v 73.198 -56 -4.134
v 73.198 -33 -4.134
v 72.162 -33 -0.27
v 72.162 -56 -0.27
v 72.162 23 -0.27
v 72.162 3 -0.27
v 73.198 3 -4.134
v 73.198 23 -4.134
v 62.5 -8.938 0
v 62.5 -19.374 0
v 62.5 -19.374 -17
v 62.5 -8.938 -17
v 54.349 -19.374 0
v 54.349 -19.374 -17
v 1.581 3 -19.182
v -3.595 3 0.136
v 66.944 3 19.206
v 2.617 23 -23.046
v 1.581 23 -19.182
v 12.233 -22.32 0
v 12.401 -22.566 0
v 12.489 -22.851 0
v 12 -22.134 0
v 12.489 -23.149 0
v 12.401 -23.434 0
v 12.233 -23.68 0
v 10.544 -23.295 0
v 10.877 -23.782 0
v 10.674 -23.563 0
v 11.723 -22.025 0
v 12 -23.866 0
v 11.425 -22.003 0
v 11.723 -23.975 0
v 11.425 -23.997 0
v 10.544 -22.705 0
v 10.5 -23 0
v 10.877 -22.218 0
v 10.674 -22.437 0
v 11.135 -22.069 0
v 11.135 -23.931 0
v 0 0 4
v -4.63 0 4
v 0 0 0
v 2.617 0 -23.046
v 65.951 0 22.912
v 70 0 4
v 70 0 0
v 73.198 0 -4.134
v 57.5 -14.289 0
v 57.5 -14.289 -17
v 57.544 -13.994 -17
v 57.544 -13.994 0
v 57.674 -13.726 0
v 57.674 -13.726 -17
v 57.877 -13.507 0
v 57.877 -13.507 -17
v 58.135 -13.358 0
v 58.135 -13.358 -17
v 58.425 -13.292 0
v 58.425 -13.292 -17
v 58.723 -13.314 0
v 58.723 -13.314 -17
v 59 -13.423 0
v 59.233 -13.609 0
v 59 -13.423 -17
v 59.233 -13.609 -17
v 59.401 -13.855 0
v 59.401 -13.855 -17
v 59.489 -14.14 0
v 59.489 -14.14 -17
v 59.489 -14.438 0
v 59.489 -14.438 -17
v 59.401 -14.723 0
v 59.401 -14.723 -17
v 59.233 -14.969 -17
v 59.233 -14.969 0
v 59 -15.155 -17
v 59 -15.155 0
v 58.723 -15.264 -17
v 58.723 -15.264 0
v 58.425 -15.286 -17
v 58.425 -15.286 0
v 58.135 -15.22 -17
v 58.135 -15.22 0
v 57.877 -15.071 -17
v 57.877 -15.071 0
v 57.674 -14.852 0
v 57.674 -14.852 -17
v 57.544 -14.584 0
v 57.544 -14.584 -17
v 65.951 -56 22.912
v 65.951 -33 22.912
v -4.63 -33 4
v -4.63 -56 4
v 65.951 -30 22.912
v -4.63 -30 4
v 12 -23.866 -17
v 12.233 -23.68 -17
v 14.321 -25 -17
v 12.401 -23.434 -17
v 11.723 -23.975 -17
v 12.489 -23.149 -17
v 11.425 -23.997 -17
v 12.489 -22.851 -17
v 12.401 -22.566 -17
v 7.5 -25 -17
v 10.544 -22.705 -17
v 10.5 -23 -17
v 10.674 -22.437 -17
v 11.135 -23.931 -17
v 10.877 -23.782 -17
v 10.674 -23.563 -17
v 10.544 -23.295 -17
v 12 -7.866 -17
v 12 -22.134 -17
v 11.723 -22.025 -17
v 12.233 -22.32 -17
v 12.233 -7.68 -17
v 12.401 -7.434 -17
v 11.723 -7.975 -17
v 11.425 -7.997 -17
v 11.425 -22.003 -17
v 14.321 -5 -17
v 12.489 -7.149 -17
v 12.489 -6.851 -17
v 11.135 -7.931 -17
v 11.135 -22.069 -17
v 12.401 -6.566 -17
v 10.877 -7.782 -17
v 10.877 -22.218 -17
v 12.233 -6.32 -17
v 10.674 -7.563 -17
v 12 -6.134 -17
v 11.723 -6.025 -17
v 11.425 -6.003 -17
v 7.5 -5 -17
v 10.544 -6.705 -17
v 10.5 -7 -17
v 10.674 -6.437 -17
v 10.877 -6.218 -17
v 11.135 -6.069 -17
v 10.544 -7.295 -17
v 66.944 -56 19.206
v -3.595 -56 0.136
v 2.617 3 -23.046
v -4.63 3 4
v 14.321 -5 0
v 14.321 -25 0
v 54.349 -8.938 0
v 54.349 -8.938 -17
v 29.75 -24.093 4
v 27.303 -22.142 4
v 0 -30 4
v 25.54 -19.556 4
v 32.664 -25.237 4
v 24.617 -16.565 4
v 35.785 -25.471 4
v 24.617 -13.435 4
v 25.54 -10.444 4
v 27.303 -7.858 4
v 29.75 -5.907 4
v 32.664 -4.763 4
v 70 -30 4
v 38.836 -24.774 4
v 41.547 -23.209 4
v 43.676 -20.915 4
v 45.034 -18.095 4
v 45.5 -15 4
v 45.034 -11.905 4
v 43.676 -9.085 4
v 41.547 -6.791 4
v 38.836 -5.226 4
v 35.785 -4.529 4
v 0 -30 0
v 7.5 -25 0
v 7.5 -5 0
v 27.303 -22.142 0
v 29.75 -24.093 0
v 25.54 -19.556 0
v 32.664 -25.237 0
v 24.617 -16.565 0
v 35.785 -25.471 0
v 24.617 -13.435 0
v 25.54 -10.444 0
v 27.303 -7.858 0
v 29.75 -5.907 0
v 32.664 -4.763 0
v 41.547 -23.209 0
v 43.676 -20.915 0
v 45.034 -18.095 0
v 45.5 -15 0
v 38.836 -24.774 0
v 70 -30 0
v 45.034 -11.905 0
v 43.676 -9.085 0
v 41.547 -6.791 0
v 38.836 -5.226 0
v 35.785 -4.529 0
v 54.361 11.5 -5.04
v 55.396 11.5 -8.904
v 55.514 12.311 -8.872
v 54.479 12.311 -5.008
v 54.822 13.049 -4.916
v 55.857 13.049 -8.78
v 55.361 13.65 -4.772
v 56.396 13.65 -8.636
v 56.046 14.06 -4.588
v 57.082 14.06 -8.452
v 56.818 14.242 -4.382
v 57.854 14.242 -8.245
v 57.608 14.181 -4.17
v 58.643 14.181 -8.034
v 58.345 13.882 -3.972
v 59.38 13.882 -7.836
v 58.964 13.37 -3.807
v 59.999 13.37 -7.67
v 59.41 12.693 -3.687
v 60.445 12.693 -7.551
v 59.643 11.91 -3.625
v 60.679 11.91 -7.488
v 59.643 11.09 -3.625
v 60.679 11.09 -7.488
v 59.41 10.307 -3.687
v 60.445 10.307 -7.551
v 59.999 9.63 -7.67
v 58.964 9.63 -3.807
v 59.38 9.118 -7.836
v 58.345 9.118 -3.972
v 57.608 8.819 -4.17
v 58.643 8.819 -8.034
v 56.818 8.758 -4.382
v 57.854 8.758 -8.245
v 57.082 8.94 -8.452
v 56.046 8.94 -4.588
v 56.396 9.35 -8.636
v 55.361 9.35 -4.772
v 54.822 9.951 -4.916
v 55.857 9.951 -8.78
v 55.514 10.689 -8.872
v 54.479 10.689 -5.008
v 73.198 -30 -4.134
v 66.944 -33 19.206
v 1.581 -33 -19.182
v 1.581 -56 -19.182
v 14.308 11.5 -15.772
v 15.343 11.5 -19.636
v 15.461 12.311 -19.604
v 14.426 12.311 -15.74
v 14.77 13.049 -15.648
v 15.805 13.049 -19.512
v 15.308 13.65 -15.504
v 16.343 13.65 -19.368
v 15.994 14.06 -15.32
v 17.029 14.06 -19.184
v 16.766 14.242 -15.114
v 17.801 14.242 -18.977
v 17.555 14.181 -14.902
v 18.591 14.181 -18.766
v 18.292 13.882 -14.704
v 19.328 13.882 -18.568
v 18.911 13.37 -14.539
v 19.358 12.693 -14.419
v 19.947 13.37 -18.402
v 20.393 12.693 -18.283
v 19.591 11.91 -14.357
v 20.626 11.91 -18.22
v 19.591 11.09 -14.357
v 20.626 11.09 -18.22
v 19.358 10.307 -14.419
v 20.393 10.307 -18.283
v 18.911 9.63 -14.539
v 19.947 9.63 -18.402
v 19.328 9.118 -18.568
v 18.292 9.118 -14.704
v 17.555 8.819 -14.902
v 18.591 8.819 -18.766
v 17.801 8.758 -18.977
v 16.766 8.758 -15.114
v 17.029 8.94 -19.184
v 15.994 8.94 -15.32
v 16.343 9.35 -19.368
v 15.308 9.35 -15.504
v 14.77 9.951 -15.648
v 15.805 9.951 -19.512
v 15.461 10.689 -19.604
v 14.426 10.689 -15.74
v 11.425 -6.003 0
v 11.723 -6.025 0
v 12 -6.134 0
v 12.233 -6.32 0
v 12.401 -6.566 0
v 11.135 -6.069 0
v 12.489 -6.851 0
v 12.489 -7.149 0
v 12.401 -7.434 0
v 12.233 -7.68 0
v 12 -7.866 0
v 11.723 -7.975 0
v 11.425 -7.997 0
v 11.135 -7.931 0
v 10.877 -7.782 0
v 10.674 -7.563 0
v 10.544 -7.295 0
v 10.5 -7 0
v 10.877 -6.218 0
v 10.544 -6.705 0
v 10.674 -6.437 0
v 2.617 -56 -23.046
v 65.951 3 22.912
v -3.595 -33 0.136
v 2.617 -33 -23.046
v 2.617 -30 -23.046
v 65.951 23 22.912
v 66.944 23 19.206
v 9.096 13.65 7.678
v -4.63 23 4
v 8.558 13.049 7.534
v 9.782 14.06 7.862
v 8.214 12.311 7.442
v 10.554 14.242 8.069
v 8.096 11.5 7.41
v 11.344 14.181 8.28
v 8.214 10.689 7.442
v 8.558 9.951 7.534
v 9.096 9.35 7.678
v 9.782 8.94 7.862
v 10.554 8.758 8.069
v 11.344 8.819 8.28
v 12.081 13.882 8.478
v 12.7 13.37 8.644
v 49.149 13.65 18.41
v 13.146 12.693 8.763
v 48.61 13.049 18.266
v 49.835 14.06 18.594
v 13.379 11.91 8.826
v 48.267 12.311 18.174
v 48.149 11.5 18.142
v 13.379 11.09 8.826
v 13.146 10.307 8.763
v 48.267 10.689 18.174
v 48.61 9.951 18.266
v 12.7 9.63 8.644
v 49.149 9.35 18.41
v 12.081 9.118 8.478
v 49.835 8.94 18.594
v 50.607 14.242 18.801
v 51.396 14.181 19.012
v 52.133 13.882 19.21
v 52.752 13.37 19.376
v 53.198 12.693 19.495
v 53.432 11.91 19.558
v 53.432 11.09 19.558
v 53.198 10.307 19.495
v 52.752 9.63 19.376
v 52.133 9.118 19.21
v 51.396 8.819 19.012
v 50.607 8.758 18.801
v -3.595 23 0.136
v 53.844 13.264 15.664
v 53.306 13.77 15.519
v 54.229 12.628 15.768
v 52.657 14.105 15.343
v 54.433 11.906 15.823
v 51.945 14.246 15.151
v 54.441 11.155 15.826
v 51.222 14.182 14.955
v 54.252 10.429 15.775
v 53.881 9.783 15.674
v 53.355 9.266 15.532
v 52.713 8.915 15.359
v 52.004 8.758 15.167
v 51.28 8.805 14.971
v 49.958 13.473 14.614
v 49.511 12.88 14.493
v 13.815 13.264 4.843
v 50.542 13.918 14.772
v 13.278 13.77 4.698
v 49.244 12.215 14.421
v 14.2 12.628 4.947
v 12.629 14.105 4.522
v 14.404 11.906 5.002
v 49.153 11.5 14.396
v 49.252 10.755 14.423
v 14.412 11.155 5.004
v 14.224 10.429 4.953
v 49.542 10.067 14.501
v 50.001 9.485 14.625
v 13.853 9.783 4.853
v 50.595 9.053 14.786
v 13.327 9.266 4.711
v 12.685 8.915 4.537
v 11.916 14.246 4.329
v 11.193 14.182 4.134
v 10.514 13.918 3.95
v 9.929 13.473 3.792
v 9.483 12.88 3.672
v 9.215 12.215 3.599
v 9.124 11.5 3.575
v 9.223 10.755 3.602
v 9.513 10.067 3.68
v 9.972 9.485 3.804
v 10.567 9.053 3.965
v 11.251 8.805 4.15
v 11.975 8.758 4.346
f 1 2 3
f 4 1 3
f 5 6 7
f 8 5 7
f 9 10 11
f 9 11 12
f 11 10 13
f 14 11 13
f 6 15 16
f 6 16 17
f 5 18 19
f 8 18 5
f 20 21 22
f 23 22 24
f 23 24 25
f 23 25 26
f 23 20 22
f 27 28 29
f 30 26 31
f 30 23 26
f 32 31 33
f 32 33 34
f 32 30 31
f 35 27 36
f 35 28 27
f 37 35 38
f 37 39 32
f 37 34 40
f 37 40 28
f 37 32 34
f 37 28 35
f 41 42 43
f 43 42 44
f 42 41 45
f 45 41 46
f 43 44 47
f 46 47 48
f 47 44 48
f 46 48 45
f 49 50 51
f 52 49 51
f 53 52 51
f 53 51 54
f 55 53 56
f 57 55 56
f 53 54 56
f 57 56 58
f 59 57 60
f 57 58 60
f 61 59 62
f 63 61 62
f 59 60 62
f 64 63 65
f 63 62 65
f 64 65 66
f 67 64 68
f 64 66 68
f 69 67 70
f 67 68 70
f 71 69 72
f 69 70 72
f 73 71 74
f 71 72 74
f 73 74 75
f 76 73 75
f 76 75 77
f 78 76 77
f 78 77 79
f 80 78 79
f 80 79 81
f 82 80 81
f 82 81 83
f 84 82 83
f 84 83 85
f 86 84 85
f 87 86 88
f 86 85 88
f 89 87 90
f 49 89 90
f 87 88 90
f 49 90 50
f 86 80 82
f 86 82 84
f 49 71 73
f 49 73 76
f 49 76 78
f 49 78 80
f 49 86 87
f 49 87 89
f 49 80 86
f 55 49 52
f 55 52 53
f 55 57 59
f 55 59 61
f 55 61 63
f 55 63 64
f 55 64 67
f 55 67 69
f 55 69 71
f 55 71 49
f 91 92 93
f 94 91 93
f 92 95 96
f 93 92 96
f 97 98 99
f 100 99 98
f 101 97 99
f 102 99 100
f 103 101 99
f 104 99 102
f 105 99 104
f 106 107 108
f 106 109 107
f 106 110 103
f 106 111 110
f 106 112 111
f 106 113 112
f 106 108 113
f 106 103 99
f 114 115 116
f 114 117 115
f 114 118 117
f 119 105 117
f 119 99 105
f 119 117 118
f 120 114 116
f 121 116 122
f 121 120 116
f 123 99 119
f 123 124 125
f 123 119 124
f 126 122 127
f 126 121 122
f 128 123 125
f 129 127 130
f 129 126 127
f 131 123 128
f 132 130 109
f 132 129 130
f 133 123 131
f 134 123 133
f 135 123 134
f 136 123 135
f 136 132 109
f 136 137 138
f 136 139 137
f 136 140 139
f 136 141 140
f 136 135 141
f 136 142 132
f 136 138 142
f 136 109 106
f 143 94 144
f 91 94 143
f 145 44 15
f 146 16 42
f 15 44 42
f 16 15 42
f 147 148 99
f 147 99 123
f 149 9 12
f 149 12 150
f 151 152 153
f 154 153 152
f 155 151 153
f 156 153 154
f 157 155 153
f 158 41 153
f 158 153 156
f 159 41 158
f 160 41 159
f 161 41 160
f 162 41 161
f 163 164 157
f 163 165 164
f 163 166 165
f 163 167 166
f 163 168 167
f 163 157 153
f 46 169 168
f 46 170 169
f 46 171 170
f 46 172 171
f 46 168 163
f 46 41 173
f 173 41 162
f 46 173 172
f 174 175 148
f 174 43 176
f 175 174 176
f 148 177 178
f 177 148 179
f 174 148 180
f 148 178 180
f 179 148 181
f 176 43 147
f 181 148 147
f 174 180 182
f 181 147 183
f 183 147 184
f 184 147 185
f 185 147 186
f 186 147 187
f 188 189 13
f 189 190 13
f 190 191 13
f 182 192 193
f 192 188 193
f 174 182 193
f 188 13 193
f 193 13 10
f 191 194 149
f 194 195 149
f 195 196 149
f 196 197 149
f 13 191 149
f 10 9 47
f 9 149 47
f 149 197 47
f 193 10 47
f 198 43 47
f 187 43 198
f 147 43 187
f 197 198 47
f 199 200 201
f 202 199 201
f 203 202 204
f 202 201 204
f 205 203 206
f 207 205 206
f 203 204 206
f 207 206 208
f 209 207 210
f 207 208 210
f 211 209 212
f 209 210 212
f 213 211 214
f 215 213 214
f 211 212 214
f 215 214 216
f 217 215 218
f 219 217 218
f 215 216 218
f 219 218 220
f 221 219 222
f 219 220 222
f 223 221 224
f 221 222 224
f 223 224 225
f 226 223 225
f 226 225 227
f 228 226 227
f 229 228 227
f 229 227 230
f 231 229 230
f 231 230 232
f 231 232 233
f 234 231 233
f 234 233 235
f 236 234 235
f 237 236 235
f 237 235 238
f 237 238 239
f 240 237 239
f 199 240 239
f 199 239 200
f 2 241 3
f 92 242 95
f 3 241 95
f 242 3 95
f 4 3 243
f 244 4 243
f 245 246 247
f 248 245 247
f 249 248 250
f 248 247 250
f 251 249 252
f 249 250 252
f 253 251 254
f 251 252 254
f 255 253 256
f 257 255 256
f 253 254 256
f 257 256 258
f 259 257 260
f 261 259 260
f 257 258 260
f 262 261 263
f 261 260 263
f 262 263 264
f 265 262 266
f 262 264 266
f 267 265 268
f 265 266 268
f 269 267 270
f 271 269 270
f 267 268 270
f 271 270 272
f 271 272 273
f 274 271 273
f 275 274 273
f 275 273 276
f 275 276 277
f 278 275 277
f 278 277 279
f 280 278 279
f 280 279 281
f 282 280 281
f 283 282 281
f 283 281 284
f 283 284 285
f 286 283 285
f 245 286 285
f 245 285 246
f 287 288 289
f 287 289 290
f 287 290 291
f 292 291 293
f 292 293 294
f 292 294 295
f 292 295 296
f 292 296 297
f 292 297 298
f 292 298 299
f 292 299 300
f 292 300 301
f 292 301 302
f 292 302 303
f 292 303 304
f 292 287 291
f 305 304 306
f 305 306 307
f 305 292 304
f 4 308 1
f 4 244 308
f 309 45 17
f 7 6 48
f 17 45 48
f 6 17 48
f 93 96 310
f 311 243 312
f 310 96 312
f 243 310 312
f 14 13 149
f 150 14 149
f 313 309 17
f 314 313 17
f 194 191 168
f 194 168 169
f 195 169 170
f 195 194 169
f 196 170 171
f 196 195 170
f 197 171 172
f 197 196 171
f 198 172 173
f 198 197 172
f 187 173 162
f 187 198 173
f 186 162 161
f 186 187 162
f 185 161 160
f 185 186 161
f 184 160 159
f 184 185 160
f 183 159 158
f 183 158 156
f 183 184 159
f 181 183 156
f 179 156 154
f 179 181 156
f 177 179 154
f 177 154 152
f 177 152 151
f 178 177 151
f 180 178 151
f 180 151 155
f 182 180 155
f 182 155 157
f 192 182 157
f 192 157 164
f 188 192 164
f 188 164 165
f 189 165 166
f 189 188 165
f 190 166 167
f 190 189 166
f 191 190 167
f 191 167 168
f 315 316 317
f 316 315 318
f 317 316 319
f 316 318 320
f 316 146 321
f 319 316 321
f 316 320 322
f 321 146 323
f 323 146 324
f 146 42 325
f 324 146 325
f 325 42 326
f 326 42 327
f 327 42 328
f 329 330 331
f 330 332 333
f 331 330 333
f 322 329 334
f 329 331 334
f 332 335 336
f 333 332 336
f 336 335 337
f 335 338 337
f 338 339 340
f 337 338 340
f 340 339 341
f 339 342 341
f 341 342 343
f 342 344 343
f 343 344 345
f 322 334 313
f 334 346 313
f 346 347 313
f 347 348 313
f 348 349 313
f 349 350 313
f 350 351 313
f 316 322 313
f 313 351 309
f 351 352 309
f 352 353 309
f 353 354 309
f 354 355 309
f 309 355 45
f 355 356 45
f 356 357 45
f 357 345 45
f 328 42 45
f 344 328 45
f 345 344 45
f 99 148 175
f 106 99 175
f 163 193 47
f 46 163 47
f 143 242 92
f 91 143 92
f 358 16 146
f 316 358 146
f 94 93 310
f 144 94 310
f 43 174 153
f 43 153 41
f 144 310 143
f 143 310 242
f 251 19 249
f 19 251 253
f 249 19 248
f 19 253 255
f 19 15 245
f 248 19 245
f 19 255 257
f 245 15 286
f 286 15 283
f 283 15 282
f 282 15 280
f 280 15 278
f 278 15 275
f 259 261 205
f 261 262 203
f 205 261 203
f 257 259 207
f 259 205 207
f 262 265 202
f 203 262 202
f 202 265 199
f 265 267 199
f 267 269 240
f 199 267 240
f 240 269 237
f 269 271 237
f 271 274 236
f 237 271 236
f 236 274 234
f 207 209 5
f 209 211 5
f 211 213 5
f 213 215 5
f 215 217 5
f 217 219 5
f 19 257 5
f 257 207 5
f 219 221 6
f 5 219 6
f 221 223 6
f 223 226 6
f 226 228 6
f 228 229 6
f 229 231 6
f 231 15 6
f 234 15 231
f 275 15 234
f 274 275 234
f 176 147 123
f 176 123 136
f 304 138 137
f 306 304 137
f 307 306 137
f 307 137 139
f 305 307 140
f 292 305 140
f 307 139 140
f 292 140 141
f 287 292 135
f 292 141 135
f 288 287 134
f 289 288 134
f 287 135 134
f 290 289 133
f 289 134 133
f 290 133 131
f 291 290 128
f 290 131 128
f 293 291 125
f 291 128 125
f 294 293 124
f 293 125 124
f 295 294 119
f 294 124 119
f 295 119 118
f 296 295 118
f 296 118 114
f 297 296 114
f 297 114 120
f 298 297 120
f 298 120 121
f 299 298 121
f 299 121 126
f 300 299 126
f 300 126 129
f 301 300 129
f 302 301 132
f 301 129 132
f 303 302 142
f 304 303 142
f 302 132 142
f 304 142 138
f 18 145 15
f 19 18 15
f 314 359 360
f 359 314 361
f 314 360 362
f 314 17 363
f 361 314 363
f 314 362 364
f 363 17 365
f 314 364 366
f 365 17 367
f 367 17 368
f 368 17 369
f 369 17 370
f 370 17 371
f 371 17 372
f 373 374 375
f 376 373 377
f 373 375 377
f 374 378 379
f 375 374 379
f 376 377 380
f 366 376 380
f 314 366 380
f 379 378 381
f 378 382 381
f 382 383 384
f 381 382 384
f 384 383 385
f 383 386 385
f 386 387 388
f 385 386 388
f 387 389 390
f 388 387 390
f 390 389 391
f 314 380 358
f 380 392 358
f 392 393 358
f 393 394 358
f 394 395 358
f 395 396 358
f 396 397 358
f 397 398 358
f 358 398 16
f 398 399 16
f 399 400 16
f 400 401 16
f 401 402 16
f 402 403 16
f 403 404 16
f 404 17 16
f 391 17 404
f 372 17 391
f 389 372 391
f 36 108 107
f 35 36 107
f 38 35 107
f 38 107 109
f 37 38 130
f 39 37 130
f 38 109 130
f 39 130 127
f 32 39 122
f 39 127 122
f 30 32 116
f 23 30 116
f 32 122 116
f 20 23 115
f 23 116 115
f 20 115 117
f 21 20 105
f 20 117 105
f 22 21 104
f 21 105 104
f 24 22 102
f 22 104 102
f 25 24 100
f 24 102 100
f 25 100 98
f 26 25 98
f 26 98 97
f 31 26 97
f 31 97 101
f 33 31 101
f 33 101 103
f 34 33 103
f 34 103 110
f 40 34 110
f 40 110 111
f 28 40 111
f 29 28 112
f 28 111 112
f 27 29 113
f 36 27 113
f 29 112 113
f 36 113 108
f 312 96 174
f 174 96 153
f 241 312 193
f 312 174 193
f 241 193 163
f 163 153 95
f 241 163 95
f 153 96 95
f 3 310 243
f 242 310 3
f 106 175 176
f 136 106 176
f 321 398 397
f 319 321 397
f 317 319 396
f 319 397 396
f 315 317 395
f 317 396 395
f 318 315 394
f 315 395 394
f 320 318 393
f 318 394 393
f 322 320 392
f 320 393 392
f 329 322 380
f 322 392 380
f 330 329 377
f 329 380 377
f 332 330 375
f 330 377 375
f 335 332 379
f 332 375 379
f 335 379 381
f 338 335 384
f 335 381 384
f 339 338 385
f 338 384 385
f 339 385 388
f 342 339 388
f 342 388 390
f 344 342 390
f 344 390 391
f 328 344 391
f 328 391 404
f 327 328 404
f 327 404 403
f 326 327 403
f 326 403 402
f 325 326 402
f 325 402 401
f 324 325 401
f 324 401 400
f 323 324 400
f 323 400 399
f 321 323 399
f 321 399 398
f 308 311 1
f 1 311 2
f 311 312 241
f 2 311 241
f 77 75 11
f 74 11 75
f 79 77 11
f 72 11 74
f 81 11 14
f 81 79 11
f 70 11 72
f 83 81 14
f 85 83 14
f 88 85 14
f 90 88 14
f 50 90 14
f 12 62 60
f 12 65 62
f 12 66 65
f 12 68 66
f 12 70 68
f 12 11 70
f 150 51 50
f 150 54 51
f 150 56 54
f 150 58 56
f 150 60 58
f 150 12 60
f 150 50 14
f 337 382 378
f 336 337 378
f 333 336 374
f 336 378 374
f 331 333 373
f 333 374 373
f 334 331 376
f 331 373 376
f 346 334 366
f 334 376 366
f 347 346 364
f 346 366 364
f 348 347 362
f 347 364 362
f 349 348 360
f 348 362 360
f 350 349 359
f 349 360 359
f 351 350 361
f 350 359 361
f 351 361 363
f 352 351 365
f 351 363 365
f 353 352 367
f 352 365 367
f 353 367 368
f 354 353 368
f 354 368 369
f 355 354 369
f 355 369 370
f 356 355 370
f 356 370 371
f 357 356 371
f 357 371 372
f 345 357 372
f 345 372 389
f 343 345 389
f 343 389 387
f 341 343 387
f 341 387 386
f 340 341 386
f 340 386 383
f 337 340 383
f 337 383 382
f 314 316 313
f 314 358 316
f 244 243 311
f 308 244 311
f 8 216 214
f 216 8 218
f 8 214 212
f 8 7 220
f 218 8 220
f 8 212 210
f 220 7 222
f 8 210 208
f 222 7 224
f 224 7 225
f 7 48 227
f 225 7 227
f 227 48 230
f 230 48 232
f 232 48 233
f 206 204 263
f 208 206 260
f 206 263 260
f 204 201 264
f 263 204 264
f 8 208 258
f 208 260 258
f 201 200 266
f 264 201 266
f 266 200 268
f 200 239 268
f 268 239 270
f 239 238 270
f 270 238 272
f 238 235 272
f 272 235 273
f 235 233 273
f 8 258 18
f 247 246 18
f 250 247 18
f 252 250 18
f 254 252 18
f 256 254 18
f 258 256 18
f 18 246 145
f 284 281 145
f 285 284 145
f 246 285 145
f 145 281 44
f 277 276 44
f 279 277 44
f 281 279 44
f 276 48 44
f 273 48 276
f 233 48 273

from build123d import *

# Parameters (mm, degrees)
SKETCH1_W           = 70
SKETCH1_H           = 30
SKETCH1_R           = 10.5
BOSS_EXTRUDE1_DEPTH = 4
SKETCH3_W           = 8.150987667
SKETCH3_H           = 10.43538234
SKETCH3_W_2         = 6.820916115
SKETCH3_H_2         = 20
BOSS_EXTRUDE2_DEPTH = 17
SKETCH4_R           = 1
CUT_EXTRUDE1_DEPTH  = 17
BOSS_EXTRUDE4_DEPTH = 3
BOSS_EXTRUDE5_DEPTH = 20
SKETCH10_R          = 2.75
CUT_EXTRUDE2_DEPTH  = 47.267747797
BOSS_EXTRUDE6_DEPTH = 3
BOSS_EXTRUDE7_DEPTH = 23


with BuildPart() as part:
    # Sketch1 → Boss-Extrude1 (new body)
    with BuildSketch(Plane.XY):
        with Locations((35, -15)):
            Rectangle(SKETCH1_W, SKETCH1_H)
        with Locations((35, -15)):
            Circle(SKETCH1_R, mode=Mode.SUBTRACT)
    extrude(amount=BOSS_EXTRUDE1_DEPTH)

    # Sketch3 → Boss-Extrude2 (add)
    with BuildSketch(Plane(origin=(0, 0, 0), x_dir=(-1, 0, 0), z_dir=(0, 0, -1))):
        with Locations((-58.424506167, -14.156074174)):
            Rectangle(SKETCH3_W, SKETCH3_H)
        with Locations((-10.910458058, -15)):
            Rectangle(SKETCH3_W_2, SKETCH3_H_2)
    extrude(amount=BOSS_EXTRUDE2_DEPTH)

    # Sketch4 → Cut-Extrude1 (cut)
    with BuildSketch(Plane(origin=(0, 0, -17), x_dir=(-1, 0, 0), z_dir=(0, 0, -1))):
        with Locations((-58.5, -14.289099526)):
            Circle(SKETCH4_R)
        with Locations((-11.5, -7)):
            Circle(SKETCH4_R)
        with Locations((-11.5, -23)):
            Circle(SKETCH4_R)
    extrude(amount=-CUT_EXTRUDE1_DEPTH, mode=Mode.SUBTRACT)

    # Sketch7 → Boss-Extrude4 (add)
    with BuildSketch(Plane(origin=(0, 0, 0), x_dir=(1, 0, 0), z_dir=(0, 1, 0))):
        Polygon((-4.630368757, -4), (65.950788783, -22.912164164), (73.197722046, 4.133758972), (2.616564506, 23.045923136), align=None)
    extrude(amount=BOSS_EXTRUDE4_DEPTH)

    # Sketch9 → Boss-Extrude5 (add)
    with BuildSketch(Plane(origin=(0, 3, 0), x_dir=(1, 0, 0), z_dir=(0, 1, 0))):
        Polygon((-4.630368757, -4), (65.950788783, -22.912164164), (66.943950204, -19.205635281), (-3.595092577, -0.136296695), align=None)
        Polygon((2.616564506, 23.045923136), (1.581288325, 19.182219831), (72.162445865, 0.270055667), (73.197722046, 4.133758972), align=None)
    extrude(amount=BOSS_EXTRUDE5_DEPTH)

    # Sketch10 → Cut-Extrude2 (cut, through all)
    with BuildSketch(Plane(origin=(5.936757371, 0, -22.156280139), x_dir=(-0.965925826, 0, -0.258819045), z_dir=(0.258819045, 0, -0.965925826))):
        with Locations((-53.953749554, 11.5)):
            Circle(SKETCH10_R)
        with Locations((-12.488324975, 11.5)):
            Circle(SKETCH10_R)
    extrude(amount=-CUT_EXTRUDE2_DEPTH, mode=Mode.SUBTRACT)

    # Sketch5 → Boss-Extrude6 (add)
    with BuildSketch(Plane.XZ.offset(30)):
        Polygon((-4.630368757, 4), (2.616564506, -23.045923136), (73.197722046, -4.133758972), (65.950788783, 22.912164164), align=None)
    extrude(amount=BOSS_EXTRUDE6_DEPTH)

    # Sketch6 → Boss-Extrude7 (add)
    with BuildSketch(Plane.XZ.offset(33)):
        Polygon((-4.630368757, 4), (-3.595092577, 0.136296695), (66.943950204, 19.205635281), (65.950788783, 22.912164164), align=None)
        Polygon((2.616564506, -23.045923136), (73.197722046, -4.133758972), (72.162445865, -0.270055667), (1.581288325, -19.182219831), align=None)
    extrude(amount=BOSS_EXTRUDE7_DEPTH)


solid = part.part
